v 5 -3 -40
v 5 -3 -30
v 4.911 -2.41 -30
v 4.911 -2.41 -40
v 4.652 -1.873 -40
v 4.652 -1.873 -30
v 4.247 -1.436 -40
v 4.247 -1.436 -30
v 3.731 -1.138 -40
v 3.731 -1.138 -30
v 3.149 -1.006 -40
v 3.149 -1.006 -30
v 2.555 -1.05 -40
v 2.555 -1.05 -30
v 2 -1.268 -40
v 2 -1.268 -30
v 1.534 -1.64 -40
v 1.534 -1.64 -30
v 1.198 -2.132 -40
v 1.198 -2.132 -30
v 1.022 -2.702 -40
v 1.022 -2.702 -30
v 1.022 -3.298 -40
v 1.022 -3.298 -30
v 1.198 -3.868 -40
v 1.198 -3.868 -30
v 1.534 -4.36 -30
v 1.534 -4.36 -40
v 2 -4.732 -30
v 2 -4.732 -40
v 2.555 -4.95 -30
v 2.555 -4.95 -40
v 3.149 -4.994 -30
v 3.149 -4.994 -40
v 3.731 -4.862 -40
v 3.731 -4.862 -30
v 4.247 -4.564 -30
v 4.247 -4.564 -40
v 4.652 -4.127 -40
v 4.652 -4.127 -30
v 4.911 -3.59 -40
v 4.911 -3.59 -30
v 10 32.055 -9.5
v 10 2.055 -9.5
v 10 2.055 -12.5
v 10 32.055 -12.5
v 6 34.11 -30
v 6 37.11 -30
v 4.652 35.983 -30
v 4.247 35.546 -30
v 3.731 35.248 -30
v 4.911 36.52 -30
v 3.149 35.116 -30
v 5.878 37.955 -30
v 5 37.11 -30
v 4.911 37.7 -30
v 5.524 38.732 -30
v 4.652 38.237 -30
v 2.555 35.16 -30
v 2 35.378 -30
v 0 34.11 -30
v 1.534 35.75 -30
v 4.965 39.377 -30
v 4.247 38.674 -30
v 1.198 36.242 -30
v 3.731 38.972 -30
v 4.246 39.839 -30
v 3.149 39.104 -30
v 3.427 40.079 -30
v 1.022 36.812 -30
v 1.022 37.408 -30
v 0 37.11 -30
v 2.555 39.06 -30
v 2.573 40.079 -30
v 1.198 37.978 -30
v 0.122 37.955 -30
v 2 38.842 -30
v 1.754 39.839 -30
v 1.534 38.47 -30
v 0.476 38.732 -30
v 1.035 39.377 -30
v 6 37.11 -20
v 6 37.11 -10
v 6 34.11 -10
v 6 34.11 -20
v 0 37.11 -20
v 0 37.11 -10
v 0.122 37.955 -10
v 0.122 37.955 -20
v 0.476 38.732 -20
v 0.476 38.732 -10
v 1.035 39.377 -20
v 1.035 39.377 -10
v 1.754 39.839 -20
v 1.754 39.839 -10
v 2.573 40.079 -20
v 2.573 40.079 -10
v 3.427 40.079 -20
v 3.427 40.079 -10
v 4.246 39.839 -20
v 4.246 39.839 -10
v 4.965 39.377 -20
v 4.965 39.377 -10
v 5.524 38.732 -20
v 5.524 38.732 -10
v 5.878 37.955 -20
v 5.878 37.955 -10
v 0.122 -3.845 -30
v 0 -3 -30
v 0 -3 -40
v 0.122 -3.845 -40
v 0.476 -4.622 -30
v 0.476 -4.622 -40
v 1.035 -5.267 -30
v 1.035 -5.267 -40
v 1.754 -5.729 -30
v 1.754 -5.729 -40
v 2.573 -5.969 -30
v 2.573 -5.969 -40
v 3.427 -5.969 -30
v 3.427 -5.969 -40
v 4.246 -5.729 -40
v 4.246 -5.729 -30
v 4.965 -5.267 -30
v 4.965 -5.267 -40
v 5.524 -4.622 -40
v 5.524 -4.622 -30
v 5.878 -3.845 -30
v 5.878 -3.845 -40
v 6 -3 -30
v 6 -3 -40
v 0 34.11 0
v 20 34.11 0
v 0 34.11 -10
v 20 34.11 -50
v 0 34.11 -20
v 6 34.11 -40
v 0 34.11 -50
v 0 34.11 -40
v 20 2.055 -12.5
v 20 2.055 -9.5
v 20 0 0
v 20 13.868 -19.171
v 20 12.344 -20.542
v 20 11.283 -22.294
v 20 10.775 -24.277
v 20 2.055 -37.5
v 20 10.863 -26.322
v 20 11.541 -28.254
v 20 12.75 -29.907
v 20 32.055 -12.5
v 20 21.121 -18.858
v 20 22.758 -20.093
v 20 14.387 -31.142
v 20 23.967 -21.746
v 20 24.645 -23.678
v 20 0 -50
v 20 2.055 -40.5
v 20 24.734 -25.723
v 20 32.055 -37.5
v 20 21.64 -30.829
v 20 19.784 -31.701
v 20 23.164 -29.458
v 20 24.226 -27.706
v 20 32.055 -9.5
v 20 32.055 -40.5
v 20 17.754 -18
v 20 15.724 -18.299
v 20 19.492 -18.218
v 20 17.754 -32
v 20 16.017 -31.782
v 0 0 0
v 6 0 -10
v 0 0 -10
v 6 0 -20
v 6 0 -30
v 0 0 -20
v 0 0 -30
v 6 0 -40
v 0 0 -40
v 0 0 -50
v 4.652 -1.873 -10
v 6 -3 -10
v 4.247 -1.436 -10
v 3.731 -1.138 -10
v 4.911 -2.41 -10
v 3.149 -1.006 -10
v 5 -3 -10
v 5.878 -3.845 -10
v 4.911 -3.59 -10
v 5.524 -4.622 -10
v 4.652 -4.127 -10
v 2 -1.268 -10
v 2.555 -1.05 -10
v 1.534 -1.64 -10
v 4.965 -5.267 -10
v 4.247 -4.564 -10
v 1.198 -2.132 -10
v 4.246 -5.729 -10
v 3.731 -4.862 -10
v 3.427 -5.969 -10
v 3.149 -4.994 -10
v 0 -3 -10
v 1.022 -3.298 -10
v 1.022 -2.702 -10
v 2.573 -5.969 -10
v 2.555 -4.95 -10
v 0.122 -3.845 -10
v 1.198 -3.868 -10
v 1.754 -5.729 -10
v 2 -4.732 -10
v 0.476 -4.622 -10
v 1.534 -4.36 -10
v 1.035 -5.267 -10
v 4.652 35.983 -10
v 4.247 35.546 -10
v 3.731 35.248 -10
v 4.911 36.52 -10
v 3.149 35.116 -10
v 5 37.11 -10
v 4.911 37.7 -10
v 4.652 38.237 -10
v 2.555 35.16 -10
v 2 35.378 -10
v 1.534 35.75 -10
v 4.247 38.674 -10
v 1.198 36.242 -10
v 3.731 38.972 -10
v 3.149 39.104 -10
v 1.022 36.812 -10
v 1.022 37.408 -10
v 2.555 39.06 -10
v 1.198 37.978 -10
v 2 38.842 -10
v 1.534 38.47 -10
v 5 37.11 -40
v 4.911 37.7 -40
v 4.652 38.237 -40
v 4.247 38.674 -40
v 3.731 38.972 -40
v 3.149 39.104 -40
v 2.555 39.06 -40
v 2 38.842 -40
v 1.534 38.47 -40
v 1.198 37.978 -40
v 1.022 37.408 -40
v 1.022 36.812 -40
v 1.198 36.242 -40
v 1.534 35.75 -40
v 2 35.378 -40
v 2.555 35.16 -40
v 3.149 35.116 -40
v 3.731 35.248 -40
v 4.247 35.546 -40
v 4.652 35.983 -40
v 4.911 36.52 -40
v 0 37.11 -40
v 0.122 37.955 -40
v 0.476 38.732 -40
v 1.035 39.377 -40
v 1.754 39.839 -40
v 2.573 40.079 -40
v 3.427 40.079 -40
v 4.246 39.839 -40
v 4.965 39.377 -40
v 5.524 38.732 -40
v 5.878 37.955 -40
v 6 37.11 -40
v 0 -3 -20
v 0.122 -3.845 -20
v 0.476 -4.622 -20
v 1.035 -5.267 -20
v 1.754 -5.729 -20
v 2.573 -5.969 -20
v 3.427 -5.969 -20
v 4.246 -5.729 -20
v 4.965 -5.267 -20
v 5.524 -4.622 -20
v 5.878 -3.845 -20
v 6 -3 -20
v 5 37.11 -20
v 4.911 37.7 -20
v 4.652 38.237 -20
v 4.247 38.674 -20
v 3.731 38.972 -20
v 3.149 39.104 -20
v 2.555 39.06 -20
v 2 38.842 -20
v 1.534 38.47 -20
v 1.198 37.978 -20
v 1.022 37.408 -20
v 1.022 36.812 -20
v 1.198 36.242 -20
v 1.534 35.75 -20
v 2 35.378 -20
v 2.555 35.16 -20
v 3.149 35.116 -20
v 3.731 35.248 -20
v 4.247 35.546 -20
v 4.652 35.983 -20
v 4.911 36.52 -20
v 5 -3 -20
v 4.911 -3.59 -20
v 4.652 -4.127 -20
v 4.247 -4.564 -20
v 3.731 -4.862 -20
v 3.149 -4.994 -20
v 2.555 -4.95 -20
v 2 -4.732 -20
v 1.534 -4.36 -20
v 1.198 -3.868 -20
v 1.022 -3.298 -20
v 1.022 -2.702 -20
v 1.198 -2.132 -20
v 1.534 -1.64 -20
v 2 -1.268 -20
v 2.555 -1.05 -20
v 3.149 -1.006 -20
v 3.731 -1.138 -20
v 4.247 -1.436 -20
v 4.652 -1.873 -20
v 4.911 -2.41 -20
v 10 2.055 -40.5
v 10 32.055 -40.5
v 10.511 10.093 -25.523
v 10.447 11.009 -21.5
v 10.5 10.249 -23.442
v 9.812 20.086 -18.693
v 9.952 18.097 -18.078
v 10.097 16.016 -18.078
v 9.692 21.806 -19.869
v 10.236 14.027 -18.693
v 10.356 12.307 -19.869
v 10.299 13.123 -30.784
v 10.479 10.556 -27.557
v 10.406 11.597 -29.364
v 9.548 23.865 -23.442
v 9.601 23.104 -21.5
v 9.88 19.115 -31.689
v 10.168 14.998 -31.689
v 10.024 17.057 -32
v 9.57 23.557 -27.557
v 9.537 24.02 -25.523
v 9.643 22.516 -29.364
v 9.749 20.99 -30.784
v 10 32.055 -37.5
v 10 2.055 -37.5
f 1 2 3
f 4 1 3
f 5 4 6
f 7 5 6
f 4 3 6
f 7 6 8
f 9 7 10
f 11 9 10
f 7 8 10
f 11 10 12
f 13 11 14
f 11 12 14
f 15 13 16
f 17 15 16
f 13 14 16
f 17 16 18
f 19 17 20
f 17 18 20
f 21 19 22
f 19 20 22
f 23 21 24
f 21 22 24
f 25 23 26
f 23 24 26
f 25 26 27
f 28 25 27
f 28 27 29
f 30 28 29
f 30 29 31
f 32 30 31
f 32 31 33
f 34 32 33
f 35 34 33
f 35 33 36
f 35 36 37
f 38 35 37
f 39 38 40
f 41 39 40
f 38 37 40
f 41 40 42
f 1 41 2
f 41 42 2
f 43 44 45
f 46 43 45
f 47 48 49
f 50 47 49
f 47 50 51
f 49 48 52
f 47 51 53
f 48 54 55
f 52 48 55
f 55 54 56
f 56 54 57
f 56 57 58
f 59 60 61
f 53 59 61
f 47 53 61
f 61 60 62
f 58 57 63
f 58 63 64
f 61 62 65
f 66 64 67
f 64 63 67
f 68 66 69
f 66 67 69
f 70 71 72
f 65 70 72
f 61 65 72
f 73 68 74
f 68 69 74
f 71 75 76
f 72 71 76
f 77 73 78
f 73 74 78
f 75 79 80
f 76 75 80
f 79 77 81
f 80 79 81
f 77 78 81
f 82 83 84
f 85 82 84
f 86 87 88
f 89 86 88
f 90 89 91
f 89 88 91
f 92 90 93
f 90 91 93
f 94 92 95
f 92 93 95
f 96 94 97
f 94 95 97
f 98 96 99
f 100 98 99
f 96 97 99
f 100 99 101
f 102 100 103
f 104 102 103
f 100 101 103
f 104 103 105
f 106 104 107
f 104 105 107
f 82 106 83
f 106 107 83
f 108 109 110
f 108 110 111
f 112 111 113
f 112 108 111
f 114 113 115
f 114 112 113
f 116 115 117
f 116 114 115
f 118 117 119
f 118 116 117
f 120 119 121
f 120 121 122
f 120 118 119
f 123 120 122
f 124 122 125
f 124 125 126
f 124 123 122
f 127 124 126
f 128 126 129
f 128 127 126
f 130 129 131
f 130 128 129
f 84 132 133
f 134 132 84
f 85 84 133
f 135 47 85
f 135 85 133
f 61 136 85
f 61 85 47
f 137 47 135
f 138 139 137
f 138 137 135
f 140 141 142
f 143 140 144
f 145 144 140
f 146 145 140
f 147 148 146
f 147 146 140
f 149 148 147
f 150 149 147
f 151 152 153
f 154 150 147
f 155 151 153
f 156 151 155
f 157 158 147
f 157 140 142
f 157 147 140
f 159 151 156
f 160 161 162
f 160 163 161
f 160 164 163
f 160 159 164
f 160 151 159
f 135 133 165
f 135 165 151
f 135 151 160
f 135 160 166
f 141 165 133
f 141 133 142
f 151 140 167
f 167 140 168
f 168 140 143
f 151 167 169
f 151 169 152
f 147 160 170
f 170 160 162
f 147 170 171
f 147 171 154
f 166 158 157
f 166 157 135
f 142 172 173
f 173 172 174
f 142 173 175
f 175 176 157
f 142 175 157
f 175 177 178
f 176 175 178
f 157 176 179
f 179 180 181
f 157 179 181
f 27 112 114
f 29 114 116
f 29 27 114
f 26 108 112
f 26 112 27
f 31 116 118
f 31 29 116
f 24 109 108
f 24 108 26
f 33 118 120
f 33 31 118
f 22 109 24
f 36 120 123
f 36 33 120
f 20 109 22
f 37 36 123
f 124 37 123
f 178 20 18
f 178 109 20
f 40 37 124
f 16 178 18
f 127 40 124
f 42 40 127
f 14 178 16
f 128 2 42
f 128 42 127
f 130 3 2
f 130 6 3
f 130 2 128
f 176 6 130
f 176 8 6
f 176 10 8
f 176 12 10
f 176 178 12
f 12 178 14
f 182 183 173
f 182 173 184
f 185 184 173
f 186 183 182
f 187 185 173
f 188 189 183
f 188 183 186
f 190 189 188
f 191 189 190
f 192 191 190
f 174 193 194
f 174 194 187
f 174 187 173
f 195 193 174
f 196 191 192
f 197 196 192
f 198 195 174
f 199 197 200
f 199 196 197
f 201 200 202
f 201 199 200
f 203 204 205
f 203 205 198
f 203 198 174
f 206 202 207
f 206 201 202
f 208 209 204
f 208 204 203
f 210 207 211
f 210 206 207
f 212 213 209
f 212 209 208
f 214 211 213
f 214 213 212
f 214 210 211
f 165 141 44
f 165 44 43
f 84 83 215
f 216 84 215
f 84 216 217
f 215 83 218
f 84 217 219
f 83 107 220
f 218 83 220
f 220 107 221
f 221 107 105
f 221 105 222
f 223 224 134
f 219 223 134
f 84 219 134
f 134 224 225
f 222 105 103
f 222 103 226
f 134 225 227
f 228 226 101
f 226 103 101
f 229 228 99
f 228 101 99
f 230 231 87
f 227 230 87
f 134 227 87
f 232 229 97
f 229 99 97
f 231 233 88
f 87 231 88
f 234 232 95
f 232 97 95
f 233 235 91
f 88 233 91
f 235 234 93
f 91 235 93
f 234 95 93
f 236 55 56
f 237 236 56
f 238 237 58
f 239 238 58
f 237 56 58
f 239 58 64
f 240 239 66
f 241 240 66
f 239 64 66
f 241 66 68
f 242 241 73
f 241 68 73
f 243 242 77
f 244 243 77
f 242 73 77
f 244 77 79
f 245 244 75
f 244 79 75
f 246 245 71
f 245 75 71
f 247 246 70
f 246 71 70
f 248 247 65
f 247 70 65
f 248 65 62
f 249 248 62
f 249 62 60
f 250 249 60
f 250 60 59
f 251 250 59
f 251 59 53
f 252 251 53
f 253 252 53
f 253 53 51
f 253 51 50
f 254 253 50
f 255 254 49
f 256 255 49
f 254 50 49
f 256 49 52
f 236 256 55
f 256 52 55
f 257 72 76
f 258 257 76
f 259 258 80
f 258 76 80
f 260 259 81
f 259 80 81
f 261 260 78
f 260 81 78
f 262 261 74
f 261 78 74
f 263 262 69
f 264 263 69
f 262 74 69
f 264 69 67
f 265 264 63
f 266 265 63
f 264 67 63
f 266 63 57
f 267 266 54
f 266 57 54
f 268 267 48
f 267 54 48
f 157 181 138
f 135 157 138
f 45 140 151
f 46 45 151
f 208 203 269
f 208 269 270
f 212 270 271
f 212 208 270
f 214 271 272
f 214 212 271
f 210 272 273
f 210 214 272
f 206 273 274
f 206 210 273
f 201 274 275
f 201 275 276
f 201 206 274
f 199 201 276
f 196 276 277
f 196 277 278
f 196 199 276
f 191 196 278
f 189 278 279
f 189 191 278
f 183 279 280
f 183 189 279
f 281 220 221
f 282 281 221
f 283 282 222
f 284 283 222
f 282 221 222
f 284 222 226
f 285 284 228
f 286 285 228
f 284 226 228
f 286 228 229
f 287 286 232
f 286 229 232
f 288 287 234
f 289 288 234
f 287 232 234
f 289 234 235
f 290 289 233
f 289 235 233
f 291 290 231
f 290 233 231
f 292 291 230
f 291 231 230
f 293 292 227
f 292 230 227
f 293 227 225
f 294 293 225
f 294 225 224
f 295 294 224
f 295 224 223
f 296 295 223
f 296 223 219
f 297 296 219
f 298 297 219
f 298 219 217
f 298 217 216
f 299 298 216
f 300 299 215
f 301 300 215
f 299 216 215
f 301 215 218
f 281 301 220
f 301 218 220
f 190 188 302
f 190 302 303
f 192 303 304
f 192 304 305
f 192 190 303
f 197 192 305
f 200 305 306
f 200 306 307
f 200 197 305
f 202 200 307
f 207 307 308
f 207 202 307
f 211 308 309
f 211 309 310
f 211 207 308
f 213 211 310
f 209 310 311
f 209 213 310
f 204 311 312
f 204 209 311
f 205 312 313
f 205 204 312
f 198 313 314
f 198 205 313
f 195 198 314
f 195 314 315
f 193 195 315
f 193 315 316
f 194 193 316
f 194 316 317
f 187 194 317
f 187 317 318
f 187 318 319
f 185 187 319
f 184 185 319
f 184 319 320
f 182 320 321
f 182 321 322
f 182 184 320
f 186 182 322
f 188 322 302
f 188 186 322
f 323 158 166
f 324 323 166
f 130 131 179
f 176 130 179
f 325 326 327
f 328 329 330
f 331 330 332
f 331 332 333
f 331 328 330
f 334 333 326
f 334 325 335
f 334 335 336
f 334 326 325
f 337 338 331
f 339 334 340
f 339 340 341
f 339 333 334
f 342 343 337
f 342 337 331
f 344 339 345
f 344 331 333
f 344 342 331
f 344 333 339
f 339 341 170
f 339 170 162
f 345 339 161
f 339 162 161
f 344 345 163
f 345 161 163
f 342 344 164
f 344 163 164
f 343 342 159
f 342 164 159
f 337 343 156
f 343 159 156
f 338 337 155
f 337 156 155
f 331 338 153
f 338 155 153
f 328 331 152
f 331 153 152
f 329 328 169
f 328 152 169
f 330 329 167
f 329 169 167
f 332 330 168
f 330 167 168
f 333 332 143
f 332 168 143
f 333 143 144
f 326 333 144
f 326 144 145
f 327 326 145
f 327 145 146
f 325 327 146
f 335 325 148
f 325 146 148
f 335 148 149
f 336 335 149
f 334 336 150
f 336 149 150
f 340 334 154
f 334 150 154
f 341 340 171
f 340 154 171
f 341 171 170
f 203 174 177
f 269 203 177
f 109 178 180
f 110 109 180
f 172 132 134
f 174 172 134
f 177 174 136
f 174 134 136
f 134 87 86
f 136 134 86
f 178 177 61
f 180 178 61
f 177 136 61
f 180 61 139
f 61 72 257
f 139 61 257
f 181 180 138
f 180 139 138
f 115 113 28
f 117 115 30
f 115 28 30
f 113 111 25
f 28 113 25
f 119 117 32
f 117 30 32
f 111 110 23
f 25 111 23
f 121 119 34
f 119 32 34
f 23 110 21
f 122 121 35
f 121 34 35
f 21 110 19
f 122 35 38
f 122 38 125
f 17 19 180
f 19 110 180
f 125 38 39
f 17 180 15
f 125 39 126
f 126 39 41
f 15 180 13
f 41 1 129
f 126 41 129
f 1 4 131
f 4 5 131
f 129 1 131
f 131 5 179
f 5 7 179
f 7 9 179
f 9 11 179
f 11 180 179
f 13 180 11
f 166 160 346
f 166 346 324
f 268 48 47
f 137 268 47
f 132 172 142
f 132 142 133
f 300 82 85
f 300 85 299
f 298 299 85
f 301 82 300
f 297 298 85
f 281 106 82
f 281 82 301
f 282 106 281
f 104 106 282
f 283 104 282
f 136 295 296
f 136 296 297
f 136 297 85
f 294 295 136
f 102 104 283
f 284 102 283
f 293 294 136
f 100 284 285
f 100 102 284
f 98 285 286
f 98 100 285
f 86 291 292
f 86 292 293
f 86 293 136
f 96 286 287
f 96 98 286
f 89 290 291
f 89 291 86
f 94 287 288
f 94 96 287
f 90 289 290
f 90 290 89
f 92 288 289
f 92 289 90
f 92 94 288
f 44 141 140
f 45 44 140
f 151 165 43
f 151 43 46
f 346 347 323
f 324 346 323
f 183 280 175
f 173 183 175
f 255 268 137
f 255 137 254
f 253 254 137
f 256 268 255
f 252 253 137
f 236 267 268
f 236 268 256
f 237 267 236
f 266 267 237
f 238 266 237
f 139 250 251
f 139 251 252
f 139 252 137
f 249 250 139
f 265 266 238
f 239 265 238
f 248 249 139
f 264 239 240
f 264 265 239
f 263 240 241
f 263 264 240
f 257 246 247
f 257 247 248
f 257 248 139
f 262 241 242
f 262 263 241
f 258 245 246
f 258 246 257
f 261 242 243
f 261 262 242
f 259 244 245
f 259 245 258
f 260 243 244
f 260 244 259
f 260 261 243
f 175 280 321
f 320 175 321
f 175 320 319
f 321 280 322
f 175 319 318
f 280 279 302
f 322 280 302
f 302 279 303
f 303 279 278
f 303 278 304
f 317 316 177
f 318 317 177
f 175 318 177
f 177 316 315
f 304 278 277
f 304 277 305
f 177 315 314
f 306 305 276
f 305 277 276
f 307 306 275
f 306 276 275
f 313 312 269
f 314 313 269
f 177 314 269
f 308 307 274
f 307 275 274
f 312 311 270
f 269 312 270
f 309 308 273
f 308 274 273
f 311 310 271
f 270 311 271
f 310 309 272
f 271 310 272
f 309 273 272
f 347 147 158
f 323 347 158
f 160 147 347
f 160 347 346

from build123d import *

# Parameters (mm, degrees)
SKETCH1_W                      = 50
SKETCH1_H                      = 34.11
BOSS_EXTRUDE1_DEPTH            = 20
SKETCH3_R                      = 2
BOSS_EXTRUDE2_DEPTH            = 10
LPATTERN1_COUNT                = 2
LPATTERN1_PITCH                = 20
MIRROR1_COPY_1_SKETCH_R        = 2
MIRROR1_COPY_1_DEPTH           = 10
SKETCH5_R                      = 7
CUT_EXTRUDE1_DEPTH             = 10
CUT_EXTRUDE1_DIRECTION_2_REACH = 3.559
SKETCH6_W                      = 3
SKETCH6_H                      = 30
CUT_EXTRUDE2_DEPTH             = 10


with BuildPart() as part:
    # Sketch1 → Boss-Extrude1 (new body)
    with BuildSketch(Plane(origin=(0, 0, 0), x_dir=(0, 0, -1), z_dir=(1, 0, 0))):
        with Locations((25, 17.055)):
            Rectangle(SKETCH1_W, SKETCH1_H)
    extrude(amount=BOSS_EXTRUDE1_DEPTH)

    # Sketch3 → Boss-Extrude2 (add)
    with BuildSketch(Plane.XY.offset(-10)):
        with BuildLine():
            Line((0, 34.11), (0, 37.11))
            ThreePointArc((0, 37.11), (3, 40.11), (6, 37.11))
            Line((6, 37.11), (6, 34.11))
            Line((6, 34.11), (3, 34.11))
            Line((3, 34.11), (0, 34.11))
        make_face()
        with Locations((3, 37.11)):
            Circle(SKETCH3_R, mode=Mode.SUBTRACT)
    boss_extrude2 = extrude(amount=-BOSS_EXTRUDE2_DEPTH)

    # LPattern1: Boss-Extrude2 ×2
    with Locations(*[(0, 0, -i * LPATTERN1_PITCH) for i in range(1, LPATTERN1_COUNT)]):
        add(boss_extrude2)

    # Mirror1: Boss-Extrude2 across plane
    add(boss_extrude2.mirror(Plane.ZX.offset(17.055)))

    # Mirror1 copy 1 sketch → Mirror1 copy 1 (add)
    with BuildSketch(Plane(origin=(0, 34.11, -30), x_dir=(1, 0, 0), z_dir=(0, 0, 1))):
        with BuildLine():
            Line((0, -34.11), (0, -37.11))
            ThreePointArc((0, -37.11), (3, -40.11), (6, -37.11))
            Line((6, -37.11), (6, -34.11))
            Line((6, -34.11), (3, -34.11))
            Line((3, -34.11), (0, -34.11))
        make_face()
        with Locations((3, -37.11)):
            Circle(MIRROR1_COPY_1_SKETCH_R, mode=Mode.SUBTRACT)
    extrude(amount=-MIRROR1_COPY_1_DEPTH)

    # Sketch5 → Cut-Extrude1 (cut)
    with BuildSketch(Plane(origin=(20, 17.754268119, -25), x_dir=(0, 0, -1), z_dir=(0.99756405, 0.069756474, 0))):
        Circle(SKETCH5_R)
    extrude(amount=-CUT_EXTRUDE1_DEPTH, mode=Mode.SUBTRACT)

    # Sketch5 → Cut-Extrude1 direction 2 (cut, up to next)
    with BuildSketch(Plane(origin=(20, 17.754268119, -25), x_dir=(0, 0, -1), z_dir=(0.99756405, 0.069756474, 0)), mode=Mode.PRIVATE) as cut_extrude1_direction_2_sk1:
        Circle(SKETCH5_R)
    cut_extrude1_direction_2_tool1 = extrude(cut_extrude1_direction_2_sk1.sketch, amount=CUT_EXTRUDE1_DIRECTION_2_REACH, mode=Mode.PRIVATE) & part.part
    add(cut_extrude1_direction_2_tool1.solids().sort_by_distance((20, 17.754268, -25))[0], mode=Mode.SUBTRACT)

    # Sketch6 → Cut-Extrude2 (cut)
    with BuildSketch(Plane(origin=(20, 0, 0), x_dir=(0, 0, -1), z_dir=(1, 0, 0))):
        with Locations((11, 17.055)):
            Rectangle(SKETCH6_W, SKETCH6_H)
        with Locations((39, 17.055)):
            Rectangle(SKETCH6_W, SKETCH6_H)
    extrude(amount=-CUT_EXTRUDE2_DEPTH, mode=Mode.SUBTRACT)


solid = part.part
